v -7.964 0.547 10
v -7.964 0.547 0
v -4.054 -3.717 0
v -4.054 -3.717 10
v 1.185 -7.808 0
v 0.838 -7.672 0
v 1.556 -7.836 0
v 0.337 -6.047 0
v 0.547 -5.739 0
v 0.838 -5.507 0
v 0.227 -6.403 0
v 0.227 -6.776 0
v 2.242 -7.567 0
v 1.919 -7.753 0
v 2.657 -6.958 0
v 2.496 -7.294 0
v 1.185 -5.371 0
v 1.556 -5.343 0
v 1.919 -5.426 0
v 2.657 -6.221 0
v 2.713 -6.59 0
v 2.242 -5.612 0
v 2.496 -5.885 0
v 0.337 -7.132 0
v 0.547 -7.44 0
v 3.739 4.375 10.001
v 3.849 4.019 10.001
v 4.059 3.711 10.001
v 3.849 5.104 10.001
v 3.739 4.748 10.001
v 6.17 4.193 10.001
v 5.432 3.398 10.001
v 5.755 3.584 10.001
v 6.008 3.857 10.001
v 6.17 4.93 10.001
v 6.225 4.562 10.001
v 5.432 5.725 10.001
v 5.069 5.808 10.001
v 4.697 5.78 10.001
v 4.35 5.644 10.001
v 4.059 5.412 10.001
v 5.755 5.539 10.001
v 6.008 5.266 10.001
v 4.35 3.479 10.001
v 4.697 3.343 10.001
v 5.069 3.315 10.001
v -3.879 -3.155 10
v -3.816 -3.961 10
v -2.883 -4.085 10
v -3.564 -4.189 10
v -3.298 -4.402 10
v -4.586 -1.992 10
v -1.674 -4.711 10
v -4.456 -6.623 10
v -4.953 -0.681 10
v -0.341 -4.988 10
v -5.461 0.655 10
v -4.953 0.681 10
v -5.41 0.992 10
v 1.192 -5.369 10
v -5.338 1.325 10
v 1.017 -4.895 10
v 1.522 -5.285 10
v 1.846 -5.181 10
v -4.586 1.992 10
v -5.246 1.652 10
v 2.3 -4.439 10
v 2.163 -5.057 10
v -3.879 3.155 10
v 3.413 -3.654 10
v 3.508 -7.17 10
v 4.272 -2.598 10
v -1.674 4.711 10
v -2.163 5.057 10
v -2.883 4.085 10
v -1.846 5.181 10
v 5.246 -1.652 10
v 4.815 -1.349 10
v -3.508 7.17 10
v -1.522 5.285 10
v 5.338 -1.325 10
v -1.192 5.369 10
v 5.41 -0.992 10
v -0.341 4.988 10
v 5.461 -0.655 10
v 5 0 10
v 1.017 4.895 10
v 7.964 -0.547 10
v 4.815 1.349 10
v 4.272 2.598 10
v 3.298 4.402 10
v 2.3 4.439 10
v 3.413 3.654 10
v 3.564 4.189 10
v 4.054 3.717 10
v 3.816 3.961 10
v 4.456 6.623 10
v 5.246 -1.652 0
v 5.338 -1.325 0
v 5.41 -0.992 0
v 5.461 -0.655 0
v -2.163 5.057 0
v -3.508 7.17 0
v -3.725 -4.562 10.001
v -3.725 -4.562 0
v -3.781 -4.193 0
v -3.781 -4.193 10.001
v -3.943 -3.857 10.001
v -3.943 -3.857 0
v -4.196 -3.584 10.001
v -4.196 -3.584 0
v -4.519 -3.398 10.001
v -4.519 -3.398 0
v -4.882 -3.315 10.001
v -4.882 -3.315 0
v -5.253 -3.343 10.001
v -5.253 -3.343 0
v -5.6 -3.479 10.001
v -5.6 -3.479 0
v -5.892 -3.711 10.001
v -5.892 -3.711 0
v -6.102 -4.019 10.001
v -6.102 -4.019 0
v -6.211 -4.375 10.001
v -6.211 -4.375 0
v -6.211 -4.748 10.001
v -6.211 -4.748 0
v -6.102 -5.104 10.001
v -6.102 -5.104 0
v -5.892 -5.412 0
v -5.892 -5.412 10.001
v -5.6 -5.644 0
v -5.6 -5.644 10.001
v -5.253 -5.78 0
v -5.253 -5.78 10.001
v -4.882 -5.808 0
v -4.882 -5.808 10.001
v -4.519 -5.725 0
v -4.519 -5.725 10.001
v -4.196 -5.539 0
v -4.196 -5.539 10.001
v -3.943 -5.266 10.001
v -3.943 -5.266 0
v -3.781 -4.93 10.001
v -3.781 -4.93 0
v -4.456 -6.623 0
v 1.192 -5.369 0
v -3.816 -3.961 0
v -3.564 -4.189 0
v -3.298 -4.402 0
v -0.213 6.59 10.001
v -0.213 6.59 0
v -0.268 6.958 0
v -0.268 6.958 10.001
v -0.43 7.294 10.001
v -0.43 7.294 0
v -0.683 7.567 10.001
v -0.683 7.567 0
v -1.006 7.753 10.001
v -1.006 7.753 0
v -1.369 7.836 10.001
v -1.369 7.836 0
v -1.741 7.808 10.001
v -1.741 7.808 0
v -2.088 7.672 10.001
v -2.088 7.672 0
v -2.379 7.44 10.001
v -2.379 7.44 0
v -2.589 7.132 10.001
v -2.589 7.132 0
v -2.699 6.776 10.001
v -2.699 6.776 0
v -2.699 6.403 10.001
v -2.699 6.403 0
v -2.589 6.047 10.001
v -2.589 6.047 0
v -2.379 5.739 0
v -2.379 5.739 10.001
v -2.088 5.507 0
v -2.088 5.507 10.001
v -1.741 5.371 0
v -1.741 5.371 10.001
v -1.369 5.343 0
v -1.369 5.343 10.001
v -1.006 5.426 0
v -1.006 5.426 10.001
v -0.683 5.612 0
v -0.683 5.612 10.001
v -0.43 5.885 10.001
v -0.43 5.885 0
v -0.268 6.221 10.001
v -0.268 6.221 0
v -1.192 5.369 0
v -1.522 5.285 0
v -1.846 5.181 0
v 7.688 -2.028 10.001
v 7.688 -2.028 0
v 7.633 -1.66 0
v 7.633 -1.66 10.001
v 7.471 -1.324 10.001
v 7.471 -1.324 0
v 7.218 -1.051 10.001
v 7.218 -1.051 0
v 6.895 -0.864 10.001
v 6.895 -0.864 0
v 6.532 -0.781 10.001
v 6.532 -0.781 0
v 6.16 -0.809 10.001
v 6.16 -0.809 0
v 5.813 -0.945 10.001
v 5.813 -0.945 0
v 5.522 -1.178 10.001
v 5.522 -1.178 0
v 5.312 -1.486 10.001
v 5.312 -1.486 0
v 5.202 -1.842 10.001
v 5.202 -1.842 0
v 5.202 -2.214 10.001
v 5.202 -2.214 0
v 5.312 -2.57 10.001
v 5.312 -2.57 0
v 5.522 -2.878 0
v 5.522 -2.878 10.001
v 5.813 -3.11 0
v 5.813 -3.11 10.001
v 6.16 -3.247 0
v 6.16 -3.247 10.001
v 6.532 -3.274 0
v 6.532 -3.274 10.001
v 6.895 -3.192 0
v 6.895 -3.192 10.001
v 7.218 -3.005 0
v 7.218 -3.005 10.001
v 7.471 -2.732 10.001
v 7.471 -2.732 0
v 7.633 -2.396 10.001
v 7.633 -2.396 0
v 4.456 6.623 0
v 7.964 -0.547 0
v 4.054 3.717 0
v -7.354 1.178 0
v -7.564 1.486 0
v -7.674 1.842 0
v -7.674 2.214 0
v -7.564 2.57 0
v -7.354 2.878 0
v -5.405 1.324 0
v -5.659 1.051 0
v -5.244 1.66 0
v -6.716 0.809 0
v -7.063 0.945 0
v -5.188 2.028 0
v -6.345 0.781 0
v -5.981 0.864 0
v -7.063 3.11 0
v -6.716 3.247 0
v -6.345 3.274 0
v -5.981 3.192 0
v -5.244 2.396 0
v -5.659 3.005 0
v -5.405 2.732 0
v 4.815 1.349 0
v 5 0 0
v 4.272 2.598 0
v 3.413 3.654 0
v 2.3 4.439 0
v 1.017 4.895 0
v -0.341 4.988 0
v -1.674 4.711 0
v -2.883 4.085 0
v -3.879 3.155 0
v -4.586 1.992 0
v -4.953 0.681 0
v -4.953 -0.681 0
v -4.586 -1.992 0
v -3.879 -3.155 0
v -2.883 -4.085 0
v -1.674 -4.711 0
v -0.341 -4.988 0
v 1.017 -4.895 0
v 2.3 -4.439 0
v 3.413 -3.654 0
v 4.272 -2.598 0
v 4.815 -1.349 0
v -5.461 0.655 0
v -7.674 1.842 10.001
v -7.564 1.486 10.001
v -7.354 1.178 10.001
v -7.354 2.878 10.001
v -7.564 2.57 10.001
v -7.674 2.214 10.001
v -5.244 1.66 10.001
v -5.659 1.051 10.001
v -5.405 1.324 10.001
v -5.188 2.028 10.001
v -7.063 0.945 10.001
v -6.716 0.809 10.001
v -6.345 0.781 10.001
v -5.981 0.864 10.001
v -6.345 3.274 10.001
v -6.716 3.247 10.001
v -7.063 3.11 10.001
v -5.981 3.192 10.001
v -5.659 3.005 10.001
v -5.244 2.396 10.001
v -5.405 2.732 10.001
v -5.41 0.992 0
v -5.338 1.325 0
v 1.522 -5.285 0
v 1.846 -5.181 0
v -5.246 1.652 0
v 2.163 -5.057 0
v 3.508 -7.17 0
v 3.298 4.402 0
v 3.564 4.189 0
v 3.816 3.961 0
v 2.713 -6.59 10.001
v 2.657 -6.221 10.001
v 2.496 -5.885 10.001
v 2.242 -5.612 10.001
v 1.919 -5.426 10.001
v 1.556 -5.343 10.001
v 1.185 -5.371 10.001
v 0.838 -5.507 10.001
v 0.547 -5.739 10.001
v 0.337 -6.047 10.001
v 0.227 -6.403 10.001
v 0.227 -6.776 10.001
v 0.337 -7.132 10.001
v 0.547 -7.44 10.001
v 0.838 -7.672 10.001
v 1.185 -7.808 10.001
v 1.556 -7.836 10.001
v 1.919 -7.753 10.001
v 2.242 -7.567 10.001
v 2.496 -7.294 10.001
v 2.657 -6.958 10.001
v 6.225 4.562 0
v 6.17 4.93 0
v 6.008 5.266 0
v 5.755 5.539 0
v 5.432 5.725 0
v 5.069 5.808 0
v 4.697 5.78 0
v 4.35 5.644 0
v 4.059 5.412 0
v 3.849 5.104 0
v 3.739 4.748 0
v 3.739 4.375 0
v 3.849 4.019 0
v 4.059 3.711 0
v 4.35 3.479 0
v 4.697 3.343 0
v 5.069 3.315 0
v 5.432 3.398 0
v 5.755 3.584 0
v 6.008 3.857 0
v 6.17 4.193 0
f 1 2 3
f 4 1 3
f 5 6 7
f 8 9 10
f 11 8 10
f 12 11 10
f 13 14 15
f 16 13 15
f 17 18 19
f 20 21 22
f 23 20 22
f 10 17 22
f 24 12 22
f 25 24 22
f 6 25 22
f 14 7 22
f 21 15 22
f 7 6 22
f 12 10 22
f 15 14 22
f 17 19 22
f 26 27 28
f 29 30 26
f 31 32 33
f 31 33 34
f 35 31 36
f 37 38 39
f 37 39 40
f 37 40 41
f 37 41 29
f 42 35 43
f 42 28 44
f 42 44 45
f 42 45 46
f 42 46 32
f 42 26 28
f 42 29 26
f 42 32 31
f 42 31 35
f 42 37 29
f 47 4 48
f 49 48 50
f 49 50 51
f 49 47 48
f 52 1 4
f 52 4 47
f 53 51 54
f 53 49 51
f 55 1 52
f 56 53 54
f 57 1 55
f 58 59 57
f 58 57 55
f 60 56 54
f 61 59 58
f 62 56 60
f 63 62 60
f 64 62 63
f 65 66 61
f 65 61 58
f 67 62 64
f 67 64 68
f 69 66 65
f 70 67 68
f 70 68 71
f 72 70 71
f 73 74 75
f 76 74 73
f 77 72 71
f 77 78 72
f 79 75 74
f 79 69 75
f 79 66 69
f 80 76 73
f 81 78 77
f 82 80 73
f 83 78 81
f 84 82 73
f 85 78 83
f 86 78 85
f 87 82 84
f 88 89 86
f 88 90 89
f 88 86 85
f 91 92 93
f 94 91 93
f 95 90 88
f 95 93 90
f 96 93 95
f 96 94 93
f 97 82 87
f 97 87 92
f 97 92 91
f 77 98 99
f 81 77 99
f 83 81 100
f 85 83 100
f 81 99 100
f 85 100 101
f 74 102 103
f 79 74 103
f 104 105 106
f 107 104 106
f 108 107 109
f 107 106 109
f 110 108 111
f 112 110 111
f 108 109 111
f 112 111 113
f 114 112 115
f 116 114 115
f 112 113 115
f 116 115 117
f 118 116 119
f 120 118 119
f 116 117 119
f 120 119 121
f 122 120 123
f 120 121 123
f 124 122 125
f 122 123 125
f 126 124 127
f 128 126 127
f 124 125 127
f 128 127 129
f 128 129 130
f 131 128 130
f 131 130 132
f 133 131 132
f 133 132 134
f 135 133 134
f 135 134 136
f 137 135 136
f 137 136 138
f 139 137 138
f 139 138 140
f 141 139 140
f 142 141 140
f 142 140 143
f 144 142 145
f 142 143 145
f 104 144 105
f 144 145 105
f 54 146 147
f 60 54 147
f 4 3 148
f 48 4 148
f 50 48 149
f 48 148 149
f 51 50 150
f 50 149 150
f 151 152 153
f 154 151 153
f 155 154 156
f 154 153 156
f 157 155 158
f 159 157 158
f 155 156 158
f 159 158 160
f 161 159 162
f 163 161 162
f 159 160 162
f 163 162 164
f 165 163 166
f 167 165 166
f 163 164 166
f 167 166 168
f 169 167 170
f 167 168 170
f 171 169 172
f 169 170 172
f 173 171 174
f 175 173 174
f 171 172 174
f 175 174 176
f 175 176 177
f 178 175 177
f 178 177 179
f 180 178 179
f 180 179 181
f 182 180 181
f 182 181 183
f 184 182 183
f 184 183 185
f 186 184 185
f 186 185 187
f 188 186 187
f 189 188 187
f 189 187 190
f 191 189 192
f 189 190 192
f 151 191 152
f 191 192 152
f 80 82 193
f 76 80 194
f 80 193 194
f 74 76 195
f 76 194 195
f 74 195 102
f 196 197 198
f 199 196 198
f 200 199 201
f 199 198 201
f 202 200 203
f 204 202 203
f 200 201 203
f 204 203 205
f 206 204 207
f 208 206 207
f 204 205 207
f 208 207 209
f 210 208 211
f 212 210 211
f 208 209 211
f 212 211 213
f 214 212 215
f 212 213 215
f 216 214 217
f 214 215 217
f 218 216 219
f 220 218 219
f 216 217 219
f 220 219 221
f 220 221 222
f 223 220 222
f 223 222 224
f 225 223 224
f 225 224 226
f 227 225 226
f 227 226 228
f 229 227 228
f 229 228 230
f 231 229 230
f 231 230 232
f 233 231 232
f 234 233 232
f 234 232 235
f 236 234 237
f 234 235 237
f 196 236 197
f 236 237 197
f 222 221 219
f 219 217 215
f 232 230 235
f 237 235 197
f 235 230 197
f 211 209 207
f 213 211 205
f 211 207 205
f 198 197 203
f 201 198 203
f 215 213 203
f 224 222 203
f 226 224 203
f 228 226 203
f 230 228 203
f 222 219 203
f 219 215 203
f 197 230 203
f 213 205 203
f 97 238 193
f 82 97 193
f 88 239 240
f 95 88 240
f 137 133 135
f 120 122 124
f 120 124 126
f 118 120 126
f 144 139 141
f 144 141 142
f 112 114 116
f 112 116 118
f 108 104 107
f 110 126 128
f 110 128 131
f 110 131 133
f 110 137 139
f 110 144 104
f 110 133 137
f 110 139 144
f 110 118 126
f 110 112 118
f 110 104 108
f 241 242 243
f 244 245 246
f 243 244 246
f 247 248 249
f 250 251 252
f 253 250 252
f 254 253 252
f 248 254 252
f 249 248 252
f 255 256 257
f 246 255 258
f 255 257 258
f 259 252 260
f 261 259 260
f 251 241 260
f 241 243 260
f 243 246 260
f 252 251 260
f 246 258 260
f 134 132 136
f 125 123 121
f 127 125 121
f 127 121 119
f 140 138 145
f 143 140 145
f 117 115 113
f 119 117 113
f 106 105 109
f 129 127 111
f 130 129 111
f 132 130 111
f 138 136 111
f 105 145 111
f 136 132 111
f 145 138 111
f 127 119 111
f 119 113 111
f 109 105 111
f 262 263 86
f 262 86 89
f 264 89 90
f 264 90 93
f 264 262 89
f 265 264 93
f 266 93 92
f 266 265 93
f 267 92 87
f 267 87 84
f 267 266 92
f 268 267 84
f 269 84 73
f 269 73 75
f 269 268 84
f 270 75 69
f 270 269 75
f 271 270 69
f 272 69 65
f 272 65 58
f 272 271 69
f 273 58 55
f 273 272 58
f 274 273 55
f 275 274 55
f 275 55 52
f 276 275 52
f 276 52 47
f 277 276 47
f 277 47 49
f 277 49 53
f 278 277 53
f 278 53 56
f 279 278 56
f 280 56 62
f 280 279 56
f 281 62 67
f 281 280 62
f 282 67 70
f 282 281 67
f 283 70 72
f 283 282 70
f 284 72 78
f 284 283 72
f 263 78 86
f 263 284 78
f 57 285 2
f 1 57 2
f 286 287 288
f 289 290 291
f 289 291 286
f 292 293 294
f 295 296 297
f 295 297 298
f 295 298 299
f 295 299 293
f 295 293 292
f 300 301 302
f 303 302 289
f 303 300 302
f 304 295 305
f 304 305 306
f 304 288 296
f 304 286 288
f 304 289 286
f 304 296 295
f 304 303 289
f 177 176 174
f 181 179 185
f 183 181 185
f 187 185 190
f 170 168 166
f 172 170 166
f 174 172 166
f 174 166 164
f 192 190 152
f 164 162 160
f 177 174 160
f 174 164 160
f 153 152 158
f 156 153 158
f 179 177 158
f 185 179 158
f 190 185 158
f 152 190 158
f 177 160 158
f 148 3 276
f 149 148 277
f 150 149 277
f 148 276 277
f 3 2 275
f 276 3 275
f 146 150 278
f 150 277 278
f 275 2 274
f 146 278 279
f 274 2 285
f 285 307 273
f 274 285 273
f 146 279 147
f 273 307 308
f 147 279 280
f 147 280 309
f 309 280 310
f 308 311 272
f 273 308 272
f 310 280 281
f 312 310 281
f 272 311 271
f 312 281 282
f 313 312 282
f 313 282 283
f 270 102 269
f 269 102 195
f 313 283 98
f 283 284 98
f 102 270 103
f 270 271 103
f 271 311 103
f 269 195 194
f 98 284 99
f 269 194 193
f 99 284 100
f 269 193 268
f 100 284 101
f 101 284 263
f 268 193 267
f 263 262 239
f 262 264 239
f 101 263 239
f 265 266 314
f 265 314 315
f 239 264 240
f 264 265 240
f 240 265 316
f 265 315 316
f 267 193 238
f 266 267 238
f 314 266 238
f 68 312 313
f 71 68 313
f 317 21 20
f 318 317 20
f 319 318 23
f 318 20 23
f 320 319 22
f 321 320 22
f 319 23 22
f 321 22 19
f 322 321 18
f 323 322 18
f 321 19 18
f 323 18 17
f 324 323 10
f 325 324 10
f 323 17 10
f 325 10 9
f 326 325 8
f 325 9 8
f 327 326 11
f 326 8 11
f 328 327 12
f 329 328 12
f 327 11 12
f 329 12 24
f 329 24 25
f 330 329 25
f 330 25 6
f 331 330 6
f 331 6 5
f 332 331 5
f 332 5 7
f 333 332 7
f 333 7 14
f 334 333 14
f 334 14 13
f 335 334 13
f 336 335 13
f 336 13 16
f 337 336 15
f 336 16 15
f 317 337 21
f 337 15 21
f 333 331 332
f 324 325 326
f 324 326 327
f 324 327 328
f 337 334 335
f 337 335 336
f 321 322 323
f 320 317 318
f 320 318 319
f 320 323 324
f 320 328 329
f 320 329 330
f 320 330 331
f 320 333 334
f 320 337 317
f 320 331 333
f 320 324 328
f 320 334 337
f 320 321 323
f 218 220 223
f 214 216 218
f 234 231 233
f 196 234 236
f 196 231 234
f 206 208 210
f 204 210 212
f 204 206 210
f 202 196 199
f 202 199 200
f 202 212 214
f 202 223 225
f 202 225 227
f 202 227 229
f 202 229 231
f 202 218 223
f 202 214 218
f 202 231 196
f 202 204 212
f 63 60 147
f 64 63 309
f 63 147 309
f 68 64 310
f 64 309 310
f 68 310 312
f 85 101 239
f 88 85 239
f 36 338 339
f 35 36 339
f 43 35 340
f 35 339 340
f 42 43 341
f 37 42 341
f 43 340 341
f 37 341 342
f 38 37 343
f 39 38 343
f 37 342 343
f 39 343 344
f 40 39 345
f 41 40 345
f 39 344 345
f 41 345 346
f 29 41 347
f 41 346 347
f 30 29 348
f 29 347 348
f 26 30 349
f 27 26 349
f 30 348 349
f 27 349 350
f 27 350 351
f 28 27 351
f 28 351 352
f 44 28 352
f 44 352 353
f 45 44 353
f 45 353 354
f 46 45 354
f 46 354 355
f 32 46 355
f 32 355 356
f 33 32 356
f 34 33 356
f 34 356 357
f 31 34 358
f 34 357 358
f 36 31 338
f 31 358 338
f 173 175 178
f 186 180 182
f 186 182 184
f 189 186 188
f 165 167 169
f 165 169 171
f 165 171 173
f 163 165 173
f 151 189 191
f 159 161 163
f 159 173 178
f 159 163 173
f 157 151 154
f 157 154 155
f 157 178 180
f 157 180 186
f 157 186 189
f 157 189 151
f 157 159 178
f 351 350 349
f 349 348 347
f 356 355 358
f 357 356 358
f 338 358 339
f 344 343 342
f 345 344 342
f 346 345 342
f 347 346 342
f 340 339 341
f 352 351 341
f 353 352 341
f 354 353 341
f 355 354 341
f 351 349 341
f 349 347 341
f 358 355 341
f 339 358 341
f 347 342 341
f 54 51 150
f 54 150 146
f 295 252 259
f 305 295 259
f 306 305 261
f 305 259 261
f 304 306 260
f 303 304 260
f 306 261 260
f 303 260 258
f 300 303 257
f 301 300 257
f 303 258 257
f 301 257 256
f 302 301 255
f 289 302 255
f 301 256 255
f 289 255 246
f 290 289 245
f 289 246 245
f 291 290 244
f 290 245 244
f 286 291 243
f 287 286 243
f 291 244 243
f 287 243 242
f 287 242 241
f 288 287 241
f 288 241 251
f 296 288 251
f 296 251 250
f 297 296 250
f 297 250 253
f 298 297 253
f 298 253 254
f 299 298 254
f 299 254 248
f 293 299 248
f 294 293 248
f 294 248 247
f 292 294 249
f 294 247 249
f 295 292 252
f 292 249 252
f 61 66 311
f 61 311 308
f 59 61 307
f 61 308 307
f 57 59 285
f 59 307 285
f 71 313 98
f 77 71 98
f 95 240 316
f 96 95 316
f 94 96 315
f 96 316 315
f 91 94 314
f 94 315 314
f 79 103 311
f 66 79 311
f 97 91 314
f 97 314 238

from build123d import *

# Parameters (mm, degrees)
SKETCH1_R                  = 5.5
SKETCH1_R_2                = 5
BOSS_EXTRUDE1_DEPTH        = 10
BOSS_EXTRUDE3_DEPTH        = 0.001
BOSS_EXTRUDE3_DEPTH_BACK   = 10
SKETCH4_R                  = 1.25
BOSS_EXTRUDE3_2_DEPTH      = 0.001
BOSS_EXTRUDE3_2_DEPTH_BACK = 10
BOSS_EXTRUDE3_3_DEPTH      = 0.001
BOSS_EXTRUDE3_3_DEPTH_BACK = 10
BOSS_EXTRUDE3_4_DEPTH      = 0.001
BOSS_EXTRUDE3_4_DEPTH_BACK = 10
BOSS_EXTRUDE3_5_DEPTH      = 0.001
BOSS_EXTRUDE3_5_DEPTH_BACK = 10
BOSS_EXTRUDE3_6_DEPTH      = 0.001
BOSS_EXTRUDE3_6_DEPTH_BACK = 10


with BuildPart() as part:
    # Sketch1 → Boss-Extrude1 (new body)
    # profile 1 of 7: a face of its own
    with BuildSketch(Plane.XY):
        with BuildLine():
            ThreePointArc((-4.053982993, -3.716883357), (-5.235597142, -1.684791549), (-5.460852174, 0.65505231))
            Line((-5.460852174, 0.65505231), (-7.963634689, 0.547350938))
            Line((-7.963634689, 0.547350938), (-4.053982993, -3.716883357))
        make_face()
    # profile 2 of 7: a face of its own
    with BuildSketch(Plane.XY):
        with BuildLine():
            ThreePointArc((-5.245906907, 1.65241058), (-4.076870853, 3.691764355), (-2.163134146, 5.056762864))
            Line((-2.163134146, 5.056762864), (-3.507797527, 7.170385416))
            Line((-3.507797527, 7.170385416), (-5.245906907, 1.65241058))
        make_face()
    # profile 3 of 7: a face of its own
    with BuildSketch(Plane.XY):
        with BuildLine():
            ThreePointArc((1.191923914, -5.369293937), (-1.15872629, -5.376555904), (-3.297718029, -4.401710554))
            Line((-3.297718029, -4.401710554), (-4.455837162, -6.623034478))
            Line((-4.455837162, -6.623034478), (1.191923914, -5.369293937))
        make_face()
    # profile 4 of 7: a face of its own
    with BuildSketch(Plane.XY):
        Circle(SKETCH1_R)
        Circle(SKETCH1_R_2, mode=Mode.SUBTRACT)
    # profile 5 of 7: a face of its own
    with BuildSketch(Plane.XY):
        with BuildLine():
            Line((3.507797527, -7.170385416), (5.245906907, -1.65241058))
            ThreePointArc((5.245906907, -1.65241058), (4.076870853, -3.691764355), (2.163134146, -5.056762864))
            Line((2.163134146, -5.056762864), (3.507797527, -7.170385416))
        make_face()
    # profile 6 of 7: a face of its own
    with BuildSketch(Plane.XY):
        with BuildLine():
            Line((7.963634689, -0.547350938), (4.053982993, 3.716883357))
            ThreePointArc((4.053982993, 3.716883357), (5.125763673, 1.994128072), (5.5, 0))
            ThreePointArc((5.5, 0), (5.49020432, -0.328110531), (5.460852174, -0.65505231))
            Line((5.460852174, -0.65505231), (7.963634689, -0.547350938))
        make_face()
    # profile 7 of 7: a face of its own
    with BuildSketch(Plane.XY):
        with BuildLine():
            Line((4.455837162, 6.623034478), (-1.191923914, 5.369293937))
            ThreePointArc((-1.191923914, 5.369293937), (1.15872629, 5.376555904), (3.297718029, 4.401710554))
            Line((3.297718029, 4.401710554), (4.455837162, 6.623034478))
        make_face()
    extrude(amount=BOSS_EXTRUDE1_DEPTH)


with BuildPart() as body_2:
    # Sketch4 → Boss-Extrude3 (new, two sides: drawn at the far end of the back side and taken through both)
    with BuildSketch(Plane.XY.offset(10).offset(-BOSS_EXTRUDE3_DEPTH_BACK)):
        with Locations((-1.462815712, 6.589588014)):
            Circle(SKETCH4_R)
    extrude(amount=BOSS_EXTRUDE3_DEPTH + BOSS_EXTRUDE3_DEPTH_BACK)


with BuildPart() as body_3:
    # Sketch4 → Boss-Extrude3 2 (new, two sides: drawn at the far end of the back side and taken through both)
    with BuildSketch(Plane.XY.offset(10).offset(-BOSS_EXTRUDE3_2_DEPTH_BACK)):
        with Locations((4.975342764, 4.561629575)):
            Circle(SKETCH4_R)
    extrude(amount=BOSS_EXTRUDE3_2_DEPTH + BOSS_EXTRUDE3_2_DEPTH_BACK)


with BuildPart() as body_4:
    # Sketch4 → Boss-Extrude3 3 (new, two sides: drawn at the far end of the back side and taken through both)
    with BuildSketch(Plane.XY.offset(10).offset(-BOSS_EXTRUDE3_3_DEPTH_BACK)):
        with Locations((6.438158477, -2.027958439)):
            Circle(SKETCH4_R)
    extrude(amount=BOSS_EXTRUDE3_3_DEPTH + BOSS_EXTRUDE3_3_DEPTH_BACK)


with BuildPart() as body_5:
    # Sketch4 → Boss-Extrude3 4 (new, two sides: drawn at the far end of the back side and taken through both)
    with BuildSketch(Plane.XY.offset(10).offset(-BOSS_EXTRUDE3_4_DEPTH_BACK)):
        with Locations((1.462815712, -6.589588014)):
            Circle(SKETCH4_R)
    extrude(amount=BOSS_EXTRUDE3_4_DEPTH + BOSS_EXTRUDE3_4_DEPTH_BACK)


with BuildPart() as body_6:
    # Sketch4 → Boss-Extrude3 5 (new, two sides: drawn at the far end of the back side and taken through both)
    with BuildSketch(Plane.XY.offset(10).offset(-BOSS_EXTRUDE3_5_DEPTH_BACK)):
        with Locations((-4.975342764, -4.561629575)):
            Circle(SKETCH4_R)
    extrude(amount=BOSS_EXTRUDE3_5_DEPTH + BOSS_EXTRUDE3_5_DEPTH_BACK)


with BuildPart() as body_7:
    # Sketch4 → Boss-Extrude3 6 (new, two sides: drawn at the far end of the back side and taken through both)
    with BuildSketch(Plane.XY.offset(10).offset(-BOSS_EXTRUDE3_6_DEPTH_BACK)):
        with Locations((-6.438158477, 2.027958439)):
            Circle(SKETCH4_R)
    extrude(amount=BOSS_EXTRUDE3_6_DEPTH + BOSS_EXTRUDE3_6_DEPTH_BACK)


solid = Compound([part.part, body_2.part, body_3.part, body_4.part, body_5.part, body_6.part, body_7.part])
